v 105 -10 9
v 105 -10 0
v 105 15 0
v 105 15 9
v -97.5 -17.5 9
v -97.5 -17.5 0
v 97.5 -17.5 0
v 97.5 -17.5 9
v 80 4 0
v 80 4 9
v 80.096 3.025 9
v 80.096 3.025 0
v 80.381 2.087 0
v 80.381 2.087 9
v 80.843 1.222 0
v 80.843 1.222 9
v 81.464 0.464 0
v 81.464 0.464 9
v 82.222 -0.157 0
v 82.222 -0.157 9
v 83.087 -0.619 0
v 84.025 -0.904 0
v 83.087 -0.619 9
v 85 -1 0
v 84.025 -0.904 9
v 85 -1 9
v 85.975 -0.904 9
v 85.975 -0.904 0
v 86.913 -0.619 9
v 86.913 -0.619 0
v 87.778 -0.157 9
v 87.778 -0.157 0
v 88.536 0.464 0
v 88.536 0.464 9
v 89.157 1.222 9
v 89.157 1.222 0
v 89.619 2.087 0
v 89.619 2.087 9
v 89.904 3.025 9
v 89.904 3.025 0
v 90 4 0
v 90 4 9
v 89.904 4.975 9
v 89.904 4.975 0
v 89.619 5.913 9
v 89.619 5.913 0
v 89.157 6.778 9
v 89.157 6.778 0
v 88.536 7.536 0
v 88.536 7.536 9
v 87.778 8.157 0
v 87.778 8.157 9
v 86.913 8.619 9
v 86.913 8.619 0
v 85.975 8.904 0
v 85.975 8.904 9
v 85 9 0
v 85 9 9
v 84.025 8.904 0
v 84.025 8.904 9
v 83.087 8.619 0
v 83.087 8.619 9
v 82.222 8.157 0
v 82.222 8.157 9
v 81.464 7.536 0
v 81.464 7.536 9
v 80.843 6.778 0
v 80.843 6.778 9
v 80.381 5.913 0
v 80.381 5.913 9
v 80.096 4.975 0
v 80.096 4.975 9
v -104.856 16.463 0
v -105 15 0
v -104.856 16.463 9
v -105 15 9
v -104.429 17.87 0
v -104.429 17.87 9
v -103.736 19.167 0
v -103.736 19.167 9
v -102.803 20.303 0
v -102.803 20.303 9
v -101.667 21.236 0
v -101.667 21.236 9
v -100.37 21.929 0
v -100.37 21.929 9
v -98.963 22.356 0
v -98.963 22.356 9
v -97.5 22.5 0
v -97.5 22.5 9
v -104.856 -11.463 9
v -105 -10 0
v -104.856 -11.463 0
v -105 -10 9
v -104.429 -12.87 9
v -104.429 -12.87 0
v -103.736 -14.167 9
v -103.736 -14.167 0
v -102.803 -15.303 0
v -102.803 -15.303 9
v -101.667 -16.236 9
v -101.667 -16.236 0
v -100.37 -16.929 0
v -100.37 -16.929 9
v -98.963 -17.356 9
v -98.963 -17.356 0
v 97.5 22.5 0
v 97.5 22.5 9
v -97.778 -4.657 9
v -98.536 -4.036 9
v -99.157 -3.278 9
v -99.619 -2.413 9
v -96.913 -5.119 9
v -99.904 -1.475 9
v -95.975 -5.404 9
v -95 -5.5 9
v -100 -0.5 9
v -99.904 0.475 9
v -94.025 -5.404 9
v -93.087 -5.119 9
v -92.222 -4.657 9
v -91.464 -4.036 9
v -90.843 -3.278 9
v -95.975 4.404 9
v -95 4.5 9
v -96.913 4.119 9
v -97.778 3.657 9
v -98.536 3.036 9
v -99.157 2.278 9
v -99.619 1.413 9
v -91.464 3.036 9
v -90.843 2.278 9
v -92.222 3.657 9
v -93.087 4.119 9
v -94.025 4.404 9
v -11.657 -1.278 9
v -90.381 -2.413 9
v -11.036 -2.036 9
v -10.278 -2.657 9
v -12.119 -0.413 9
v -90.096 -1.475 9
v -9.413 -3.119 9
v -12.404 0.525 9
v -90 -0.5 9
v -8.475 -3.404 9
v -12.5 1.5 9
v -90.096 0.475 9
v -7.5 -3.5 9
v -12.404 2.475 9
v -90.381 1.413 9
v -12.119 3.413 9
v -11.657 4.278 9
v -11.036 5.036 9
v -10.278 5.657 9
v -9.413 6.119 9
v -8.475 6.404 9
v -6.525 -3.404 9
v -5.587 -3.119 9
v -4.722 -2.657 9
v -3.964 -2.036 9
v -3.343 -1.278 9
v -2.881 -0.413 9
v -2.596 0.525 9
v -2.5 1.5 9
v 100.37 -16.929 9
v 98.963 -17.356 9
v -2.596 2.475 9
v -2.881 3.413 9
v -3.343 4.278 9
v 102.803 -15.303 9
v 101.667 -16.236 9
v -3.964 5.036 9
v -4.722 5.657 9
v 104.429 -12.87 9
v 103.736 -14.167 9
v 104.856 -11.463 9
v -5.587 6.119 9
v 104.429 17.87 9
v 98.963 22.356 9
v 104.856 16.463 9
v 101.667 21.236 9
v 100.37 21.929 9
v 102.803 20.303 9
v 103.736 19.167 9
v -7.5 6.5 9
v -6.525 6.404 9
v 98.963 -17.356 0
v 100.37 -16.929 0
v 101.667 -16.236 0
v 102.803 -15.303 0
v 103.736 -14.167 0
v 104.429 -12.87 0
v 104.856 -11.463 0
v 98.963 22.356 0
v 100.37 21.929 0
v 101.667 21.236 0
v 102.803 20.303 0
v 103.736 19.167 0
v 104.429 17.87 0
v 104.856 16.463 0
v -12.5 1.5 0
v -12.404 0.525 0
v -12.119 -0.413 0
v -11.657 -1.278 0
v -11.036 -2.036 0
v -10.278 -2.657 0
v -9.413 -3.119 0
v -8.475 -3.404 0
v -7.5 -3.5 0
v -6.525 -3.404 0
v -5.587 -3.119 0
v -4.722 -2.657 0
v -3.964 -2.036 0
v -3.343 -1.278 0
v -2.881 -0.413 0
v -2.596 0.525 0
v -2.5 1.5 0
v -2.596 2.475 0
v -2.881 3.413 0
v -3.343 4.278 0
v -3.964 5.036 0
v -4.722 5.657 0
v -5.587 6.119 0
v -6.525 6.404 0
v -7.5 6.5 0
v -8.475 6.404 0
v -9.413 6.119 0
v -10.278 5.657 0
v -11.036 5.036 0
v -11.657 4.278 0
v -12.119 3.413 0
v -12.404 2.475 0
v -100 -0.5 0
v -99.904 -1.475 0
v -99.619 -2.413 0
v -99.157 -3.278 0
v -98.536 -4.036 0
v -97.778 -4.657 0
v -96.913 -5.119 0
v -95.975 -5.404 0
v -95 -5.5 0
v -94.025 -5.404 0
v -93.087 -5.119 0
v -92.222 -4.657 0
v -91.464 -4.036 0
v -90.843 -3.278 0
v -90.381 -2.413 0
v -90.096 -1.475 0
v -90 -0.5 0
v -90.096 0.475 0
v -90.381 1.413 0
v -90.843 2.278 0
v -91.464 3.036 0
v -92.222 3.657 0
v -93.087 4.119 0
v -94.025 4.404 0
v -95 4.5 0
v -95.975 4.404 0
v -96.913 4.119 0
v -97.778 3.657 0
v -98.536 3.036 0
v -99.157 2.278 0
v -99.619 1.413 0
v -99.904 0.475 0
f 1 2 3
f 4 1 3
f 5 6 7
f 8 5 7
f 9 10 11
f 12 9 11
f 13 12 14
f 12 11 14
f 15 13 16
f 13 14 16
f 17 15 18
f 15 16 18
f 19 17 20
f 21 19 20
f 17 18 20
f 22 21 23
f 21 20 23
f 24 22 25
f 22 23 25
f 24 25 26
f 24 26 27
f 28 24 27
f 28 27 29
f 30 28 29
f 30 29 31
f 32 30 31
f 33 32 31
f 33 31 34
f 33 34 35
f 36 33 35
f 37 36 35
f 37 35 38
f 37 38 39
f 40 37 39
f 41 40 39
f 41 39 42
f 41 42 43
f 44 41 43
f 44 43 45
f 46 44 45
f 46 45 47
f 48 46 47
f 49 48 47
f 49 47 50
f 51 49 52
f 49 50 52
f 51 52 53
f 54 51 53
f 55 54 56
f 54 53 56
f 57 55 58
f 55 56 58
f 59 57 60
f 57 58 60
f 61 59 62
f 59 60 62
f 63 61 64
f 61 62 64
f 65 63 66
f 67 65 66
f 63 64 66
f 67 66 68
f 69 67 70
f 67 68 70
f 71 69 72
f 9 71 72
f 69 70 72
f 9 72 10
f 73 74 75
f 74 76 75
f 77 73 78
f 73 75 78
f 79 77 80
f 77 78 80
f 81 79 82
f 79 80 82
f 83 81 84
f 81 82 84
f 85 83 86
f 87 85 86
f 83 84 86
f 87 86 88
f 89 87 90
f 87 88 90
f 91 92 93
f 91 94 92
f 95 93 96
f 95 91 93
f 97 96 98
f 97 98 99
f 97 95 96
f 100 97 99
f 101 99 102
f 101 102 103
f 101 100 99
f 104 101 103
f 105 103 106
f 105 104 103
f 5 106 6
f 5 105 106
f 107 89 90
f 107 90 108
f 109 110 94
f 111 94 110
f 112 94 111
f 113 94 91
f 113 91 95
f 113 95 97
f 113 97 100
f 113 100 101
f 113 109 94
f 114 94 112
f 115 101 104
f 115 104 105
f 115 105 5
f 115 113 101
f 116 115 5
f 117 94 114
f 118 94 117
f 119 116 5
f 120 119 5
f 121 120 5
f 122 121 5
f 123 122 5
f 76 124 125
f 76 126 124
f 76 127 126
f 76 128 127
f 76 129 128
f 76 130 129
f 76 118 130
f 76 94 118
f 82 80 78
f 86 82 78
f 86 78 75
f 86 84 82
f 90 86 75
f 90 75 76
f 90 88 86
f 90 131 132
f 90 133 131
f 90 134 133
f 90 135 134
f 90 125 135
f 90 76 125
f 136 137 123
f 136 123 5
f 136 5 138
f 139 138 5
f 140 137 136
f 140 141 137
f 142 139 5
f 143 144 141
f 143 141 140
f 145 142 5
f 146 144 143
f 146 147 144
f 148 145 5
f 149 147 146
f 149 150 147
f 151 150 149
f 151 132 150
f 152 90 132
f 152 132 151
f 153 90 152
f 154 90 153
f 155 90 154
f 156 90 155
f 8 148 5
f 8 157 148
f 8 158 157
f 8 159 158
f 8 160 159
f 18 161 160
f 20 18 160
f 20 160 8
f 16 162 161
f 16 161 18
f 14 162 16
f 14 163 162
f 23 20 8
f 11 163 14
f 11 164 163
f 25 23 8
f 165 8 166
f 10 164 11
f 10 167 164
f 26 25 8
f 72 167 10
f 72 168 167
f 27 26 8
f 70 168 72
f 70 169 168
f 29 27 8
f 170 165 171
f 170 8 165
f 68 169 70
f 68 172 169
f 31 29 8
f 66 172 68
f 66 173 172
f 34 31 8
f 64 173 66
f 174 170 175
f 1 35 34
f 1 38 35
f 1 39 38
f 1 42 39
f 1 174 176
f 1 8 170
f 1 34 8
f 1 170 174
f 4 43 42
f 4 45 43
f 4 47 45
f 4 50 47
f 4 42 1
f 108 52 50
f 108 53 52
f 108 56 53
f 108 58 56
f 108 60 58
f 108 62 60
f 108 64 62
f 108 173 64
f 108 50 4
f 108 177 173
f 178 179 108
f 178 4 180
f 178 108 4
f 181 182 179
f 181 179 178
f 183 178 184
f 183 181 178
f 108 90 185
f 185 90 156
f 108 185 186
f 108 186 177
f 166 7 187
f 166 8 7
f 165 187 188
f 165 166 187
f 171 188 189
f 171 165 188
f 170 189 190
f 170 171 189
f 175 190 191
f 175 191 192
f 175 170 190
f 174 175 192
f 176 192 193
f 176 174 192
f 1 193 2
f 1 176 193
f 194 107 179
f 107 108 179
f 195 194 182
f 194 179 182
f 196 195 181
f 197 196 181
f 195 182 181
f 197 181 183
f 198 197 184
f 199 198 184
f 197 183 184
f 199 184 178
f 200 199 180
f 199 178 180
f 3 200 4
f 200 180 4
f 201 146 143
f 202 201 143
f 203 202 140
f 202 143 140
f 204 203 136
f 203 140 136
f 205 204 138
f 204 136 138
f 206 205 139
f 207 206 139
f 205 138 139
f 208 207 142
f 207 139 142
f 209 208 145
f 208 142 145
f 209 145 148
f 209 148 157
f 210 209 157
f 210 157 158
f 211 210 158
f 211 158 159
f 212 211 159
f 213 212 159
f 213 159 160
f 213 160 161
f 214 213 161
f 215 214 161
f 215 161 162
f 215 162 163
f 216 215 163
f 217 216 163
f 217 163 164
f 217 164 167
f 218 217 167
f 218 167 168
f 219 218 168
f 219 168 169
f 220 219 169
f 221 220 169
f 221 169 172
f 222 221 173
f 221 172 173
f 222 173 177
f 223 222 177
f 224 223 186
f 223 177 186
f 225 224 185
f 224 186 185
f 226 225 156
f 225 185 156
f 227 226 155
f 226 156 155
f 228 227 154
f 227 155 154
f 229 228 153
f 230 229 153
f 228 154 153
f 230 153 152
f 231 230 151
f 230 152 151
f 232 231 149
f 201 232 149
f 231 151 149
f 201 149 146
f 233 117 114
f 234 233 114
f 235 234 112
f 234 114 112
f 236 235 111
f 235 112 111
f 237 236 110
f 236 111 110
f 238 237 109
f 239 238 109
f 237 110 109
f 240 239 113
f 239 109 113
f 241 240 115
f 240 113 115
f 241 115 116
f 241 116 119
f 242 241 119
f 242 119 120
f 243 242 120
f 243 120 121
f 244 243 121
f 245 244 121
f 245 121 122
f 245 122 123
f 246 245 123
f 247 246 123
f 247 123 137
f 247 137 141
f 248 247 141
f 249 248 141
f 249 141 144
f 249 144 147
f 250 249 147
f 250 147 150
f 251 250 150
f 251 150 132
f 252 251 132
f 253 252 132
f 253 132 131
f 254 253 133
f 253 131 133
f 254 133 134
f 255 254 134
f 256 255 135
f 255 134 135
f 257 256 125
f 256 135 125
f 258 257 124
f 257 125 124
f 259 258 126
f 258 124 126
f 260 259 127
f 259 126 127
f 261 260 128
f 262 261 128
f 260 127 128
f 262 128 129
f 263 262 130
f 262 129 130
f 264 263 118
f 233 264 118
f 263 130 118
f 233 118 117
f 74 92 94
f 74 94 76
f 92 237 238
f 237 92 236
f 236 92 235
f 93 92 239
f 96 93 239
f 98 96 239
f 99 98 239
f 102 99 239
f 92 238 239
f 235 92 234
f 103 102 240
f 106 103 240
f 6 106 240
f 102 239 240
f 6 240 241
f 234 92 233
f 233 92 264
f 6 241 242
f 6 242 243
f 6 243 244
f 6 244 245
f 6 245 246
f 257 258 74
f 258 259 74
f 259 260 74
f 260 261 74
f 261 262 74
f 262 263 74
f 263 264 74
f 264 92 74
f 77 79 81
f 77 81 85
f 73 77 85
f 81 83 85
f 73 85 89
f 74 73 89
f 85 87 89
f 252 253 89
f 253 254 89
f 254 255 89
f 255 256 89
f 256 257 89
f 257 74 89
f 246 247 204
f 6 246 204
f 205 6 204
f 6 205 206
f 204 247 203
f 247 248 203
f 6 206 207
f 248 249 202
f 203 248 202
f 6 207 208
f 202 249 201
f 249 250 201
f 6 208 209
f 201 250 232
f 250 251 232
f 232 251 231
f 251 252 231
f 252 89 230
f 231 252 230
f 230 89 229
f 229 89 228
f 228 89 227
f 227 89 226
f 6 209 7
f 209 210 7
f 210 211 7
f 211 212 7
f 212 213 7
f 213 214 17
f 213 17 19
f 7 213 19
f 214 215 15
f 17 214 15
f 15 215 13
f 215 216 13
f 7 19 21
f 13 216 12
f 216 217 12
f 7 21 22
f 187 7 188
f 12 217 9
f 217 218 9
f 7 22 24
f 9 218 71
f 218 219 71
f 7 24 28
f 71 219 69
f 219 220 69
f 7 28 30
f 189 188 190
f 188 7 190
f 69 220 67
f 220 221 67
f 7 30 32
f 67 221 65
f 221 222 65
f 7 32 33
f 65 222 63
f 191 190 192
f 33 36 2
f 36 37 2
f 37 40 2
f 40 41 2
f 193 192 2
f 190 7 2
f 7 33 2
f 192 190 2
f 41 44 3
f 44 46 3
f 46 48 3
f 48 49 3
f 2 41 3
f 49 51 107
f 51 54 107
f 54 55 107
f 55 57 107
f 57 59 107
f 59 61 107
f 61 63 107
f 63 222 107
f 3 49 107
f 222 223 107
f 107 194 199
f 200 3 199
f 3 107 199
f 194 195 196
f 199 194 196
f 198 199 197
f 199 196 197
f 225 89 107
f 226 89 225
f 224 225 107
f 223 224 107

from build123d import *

# Parameters (mm, degrees)
F0_W     = 210
F0_H     = 40
F1_DEPTH = 9
F2_D     = 10
F3_R     = 7.5


with BuildPart() as f1:
    # F0 (on Top) → F1 (new body)
    with BuildSketch(Plane.XY):
        with Locations((0, 2.5)):
            Rectangle(F0_W, F0_H)
    extrude(amount=F1_DEPTH)

    # F2 (through all)
    with Locations(Plane(origin=(0, 0, 0), x_dir=(1, 0, 0), z_dir=(0, 0, -1))):
        with Locations((-95, 0.5), (-7.5, -1.5), (85, -4)):
            Hole(F2_D / 2)

    # F3
    f3_edges = [f1.edges().sort_by_distance(p)[0] for p in [
        (-105, 22.5, 4.5),
        (-105, -17.5, 4.5),
        (105, 22.5, 4.5),
        (105, -17.5, 4.5),
    ]]
    fillet(f3_edges, radius=F3_R)


solid = f1.part
